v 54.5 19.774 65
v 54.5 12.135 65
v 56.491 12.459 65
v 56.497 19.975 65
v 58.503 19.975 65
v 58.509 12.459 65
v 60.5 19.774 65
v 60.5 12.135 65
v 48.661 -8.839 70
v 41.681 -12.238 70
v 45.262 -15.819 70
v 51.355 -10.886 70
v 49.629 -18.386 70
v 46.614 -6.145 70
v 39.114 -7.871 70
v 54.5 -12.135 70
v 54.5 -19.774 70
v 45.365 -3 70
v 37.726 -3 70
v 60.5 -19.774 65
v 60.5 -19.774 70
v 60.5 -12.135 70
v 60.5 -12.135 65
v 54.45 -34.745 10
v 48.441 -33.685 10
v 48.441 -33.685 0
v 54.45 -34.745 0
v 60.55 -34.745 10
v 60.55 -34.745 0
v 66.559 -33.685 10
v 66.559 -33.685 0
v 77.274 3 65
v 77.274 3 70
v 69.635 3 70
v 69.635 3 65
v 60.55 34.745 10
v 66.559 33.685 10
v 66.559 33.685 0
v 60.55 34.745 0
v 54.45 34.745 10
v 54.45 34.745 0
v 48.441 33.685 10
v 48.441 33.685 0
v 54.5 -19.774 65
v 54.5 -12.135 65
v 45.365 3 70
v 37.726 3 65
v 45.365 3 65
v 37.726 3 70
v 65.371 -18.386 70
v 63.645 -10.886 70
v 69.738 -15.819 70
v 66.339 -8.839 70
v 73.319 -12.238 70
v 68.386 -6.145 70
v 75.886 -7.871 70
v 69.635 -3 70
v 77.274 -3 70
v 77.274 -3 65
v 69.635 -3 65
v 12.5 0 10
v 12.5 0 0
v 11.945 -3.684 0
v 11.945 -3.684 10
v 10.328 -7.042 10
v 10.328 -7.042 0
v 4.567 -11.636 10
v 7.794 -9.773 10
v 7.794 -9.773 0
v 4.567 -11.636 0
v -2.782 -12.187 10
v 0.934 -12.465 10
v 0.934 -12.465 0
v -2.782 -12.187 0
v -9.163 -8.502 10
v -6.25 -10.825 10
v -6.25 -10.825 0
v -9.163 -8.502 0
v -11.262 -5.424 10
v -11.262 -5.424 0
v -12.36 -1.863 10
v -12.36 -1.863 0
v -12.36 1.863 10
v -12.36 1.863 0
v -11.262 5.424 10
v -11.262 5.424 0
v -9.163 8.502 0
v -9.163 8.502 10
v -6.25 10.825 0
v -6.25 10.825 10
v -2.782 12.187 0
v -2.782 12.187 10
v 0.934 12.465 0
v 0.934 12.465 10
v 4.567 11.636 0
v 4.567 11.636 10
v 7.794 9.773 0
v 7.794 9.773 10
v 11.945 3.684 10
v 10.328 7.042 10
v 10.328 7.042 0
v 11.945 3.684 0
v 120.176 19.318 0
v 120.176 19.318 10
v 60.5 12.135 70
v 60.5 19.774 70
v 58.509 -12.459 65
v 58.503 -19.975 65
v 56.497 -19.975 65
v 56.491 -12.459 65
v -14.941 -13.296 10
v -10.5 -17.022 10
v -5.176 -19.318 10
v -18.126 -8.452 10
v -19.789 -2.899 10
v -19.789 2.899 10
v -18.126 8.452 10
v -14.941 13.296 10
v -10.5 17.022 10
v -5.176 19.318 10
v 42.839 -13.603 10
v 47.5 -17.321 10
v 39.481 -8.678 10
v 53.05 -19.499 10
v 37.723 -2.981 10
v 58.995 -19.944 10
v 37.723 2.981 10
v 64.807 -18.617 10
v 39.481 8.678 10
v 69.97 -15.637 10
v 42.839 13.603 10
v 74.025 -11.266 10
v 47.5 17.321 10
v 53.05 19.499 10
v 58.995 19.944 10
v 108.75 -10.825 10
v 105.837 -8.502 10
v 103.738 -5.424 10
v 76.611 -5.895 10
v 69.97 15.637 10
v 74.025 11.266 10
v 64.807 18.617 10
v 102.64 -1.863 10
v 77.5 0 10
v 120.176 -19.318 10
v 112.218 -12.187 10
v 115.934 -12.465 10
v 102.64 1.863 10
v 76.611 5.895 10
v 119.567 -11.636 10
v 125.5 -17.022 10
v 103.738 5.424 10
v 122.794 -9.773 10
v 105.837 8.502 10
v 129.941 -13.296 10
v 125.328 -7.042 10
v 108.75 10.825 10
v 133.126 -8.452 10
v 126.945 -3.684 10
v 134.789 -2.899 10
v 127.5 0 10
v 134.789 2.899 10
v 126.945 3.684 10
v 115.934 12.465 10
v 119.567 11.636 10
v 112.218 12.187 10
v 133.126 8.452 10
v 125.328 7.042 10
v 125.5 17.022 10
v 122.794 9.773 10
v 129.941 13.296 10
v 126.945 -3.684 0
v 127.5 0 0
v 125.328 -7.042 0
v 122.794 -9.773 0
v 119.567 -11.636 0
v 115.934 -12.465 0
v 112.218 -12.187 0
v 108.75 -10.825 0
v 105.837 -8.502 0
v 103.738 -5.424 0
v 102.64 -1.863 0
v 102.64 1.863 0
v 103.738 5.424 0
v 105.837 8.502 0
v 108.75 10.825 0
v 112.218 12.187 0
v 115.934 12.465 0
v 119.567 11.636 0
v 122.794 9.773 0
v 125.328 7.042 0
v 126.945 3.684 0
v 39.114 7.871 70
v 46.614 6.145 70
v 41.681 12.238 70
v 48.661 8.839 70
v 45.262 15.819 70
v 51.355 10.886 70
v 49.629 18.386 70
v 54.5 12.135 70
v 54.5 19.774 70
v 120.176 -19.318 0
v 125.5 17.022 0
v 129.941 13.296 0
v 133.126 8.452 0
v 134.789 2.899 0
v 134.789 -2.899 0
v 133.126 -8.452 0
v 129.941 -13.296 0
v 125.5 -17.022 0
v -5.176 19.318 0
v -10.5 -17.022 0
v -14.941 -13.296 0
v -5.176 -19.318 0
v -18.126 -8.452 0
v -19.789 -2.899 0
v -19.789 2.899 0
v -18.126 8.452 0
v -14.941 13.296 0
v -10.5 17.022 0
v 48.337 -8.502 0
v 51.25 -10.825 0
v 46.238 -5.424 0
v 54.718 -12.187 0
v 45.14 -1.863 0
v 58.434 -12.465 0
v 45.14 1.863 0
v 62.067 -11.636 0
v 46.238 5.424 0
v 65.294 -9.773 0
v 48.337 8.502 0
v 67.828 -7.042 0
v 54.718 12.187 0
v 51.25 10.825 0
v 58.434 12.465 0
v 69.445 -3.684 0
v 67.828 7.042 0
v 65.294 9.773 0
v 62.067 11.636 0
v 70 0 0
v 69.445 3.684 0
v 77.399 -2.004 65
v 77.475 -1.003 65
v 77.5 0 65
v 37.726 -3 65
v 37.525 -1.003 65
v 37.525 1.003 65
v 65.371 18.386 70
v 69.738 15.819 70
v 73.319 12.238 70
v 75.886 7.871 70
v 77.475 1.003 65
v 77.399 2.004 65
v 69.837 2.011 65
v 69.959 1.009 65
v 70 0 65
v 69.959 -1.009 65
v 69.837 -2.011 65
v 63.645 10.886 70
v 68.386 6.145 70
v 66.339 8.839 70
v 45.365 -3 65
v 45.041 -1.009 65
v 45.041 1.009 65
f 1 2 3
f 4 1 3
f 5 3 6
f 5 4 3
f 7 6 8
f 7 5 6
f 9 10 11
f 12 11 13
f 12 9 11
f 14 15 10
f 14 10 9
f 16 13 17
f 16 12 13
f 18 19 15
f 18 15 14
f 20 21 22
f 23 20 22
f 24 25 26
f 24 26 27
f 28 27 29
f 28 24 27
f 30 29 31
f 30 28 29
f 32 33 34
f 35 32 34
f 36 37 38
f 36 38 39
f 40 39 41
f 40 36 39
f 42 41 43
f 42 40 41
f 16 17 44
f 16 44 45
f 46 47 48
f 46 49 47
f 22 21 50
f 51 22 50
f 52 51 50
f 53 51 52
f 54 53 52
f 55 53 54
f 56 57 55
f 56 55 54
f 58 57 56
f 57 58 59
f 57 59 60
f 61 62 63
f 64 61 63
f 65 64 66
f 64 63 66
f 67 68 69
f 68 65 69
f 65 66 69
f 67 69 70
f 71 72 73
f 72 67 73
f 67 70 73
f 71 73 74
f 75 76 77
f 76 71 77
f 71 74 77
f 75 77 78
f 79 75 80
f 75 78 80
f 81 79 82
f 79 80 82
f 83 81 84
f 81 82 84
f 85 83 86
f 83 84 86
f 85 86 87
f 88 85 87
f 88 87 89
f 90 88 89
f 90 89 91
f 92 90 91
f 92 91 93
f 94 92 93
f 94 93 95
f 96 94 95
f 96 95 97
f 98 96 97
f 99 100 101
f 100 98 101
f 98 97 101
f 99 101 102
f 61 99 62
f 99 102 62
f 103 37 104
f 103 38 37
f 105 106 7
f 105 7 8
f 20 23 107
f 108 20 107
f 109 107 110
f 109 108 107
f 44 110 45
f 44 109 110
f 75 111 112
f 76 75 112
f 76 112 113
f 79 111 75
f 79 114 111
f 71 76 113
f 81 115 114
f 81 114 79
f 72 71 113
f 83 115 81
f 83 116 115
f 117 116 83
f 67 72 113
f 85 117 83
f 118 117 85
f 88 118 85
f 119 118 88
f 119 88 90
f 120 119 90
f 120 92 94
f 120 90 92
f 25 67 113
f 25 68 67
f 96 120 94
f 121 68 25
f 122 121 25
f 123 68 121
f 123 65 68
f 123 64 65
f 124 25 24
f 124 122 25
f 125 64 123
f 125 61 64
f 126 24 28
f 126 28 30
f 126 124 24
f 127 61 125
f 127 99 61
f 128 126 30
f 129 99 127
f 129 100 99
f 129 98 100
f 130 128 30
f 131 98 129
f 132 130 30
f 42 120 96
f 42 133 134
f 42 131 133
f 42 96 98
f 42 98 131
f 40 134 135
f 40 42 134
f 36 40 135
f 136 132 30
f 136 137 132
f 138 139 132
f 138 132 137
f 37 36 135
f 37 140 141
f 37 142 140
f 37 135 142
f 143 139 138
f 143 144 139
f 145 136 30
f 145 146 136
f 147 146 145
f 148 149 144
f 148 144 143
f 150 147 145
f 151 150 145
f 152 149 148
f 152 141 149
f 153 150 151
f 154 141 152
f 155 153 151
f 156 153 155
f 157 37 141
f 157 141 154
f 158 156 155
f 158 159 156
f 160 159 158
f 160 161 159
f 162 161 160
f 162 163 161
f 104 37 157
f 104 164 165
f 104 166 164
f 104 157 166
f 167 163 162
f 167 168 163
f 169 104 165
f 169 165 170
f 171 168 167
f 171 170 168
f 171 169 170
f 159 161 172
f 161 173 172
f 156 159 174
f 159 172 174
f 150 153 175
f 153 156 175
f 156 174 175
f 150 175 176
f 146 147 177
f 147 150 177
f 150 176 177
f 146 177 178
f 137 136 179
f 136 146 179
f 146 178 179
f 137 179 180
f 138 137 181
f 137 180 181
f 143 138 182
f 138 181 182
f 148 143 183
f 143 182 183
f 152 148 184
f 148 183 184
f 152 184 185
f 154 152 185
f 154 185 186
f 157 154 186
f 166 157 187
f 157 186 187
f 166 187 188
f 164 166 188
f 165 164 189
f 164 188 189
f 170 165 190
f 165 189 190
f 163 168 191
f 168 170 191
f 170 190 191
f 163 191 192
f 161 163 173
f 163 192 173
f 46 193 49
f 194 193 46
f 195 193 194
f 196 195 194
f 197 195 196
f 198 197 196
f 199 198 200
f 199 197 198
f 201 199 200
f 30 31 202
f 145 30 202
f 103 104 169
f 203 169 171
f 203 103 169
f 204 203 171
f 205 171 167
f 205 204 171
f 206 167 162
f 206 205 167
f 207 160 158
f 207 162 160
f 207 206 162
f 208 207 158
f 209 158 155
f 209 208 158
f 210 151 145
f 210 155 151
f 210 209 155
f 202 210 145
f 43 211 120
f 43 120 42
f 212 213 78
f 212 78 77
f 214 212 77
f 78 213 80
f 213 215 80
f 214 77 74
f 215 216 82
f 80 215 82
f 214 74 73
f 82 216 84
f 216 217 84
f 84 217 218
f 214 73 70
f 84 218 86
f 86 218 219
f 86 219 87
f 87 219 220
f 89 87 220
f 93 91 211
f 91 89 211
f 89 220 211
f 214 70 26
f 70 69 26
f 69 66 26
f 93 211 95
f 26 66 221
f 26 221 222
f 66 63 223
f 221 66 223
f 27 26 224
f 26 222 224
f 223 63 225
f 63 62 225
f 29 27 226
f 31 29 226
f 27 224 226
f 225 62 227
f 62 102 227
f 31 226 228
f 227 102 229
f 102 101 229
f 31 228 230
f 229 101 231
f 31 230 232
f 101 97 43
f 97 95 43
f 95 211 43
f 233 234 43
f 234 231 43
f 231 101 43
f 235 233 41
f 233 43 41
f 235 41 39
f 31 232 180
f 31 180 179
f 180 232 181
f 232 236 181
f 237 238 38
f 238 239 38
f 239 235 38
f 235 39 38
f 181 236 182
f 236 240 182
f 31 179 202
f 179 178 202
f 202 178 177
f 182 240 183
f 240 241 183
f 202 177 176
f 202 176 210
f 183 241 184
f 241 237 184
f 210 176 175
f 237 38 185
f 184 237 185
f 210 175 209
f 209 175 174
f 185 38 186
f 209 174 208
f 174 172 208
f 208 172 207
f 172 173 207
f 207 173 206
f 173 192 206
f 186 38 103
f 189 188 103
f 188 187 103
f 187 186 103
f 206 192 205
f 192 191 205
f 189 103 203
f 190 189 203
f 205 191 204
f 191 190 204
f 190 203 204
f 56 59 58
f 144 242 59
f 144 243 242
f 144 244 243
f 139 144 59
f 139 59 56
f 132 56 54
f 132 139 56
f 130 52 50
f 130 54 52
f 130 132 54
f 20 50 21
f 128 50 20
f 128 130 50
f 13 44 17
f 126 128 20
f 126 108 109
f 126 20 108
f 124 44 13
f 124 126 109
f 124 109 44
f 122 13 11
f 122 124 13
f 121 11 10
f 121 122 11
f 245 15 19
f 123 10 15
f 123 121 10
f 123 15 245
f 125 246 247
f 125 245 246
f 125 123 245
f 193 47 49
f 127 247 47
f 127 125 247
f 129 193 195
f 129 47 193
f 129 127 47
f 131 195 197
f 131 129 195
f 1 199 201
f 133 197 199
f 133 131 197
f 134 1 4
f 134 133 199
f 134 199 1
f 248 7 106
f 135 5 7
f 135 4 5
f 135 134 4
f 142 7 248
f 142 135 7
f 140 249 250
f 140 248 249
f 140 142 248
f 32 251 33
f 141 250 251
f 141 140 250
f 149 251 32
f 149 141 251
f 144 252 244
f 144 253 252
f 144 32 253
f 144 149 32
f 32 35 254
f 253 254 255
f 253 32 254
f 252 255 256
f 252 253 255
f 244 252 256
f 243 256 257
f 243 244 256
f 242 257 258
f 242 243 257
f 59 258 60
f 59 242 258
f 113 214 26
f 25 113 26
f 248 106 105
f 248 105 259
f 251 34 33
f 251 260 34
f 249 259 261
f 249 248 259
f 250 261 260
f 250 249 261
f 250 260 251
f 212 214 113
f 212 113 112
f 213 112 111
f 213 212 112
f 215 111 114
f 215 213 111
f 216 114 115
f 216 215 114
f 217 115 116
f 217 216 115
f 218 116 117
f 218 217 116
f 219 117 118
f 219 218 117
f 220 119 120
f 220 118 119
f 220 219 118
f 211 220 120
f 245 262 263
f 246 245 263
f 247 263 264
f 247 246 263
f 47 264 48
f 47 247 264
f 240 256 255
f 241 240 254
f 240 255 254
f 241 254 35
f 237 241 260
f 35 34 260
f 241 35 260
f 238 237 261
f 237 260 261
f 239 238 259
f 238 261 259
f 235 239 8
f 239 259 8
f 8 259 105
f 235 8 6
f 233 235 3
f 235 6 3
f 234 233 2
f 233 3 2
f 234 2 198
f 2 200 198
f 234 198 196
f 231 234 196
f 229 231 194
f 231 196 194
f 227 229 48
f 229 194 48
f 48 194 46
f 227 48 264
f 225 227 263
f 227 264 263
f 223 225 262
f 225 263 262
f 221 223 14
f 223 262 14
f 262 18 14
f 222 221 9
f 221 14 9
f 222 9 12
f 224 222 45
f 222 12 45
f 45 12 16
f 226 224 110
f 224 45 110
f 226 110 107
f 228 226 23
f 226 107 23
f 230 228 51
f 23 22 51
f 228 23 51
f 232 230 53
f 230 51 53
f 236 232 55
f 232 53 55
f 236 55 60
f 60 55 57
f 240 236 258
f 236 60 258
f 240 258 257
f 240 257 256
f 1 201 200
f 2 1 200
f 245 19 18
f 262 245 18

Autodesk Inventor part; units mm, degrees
ref_plane "YZ Plane" through (0, 0, 0) normal (1, 0, 0) x (0, 1, 0)
ref_plane "XZ Plane" through (0, 0, 0) normal (0, 1, 0) x (-1, 0, 0)
ref_plane "XY Plane" through (0, 0, 0) normal (0, 0, 1) x (1, 0, 0)
sketch "Skizze1" plane through (0, 0, 0) normal (0, 0, 1) x (1, 0, 0)
  circle A0 centre (0, 0) radius 20
  line L0 (-5.1764, 19.3185) -> (57.5, 36.1126)
  line L1 (-5.1764, -19.3185) -> (57.5, -36.1126)
  circle A1 centre (115, 0) radius 20
  line L2 (57.5, 36.1126) -> (120.1764, 19.3185)
  line L3 (57.5, -36.1126) -> (120.1764, -19.3185)
  circle A2 centre (115, 0) radius 12.5
  circle A3 centre (0, 0) radius 12.5
  dimension "d4" = 40
  dimension "d5" = 25
  dimension "d6" = 25
  dimension "d7" = 115
  dimension "d8" = 57.5
  dimension "d9" = 30
  dimension "d10" = 30
extrude "Extrusion1" add sketch "Skizze1" along normal blind 10
sketch "Skizze2" plane through (0, 0, 10) normal (0, 0, 1) x (1, 0, 0)
  circle A0 centre (57.5, 0) radius 20
  point P0 (0, 0)
  point P1 (57.5, 36.1126)
  dimension "d13" = 40
extrude "Extrusion2" add sketch "Skizze2" along normal blind 60
sketch "Skizze3" plane through (57.5, 0, 70) normal (0, 0, 1) x (1, 0, 0)
  circle A0 centre (0, 0) radius 20 projected
  line L0 (0, 0) -> (0, 5.5377) construction
  circle A1 centre (0, 0) radius 12.5
  point P0 (-57.5, 0)
  dimension "d17" = 25
extrude "Extrusion3" cut sketch "Skizze3" against normal up to surface (70 mm away) contours A1
sketch "Skizze4" plane through (57.5, 0, 70) normal (0, 0, 1) x (1, 0, 0)
  circle A0 centre (0, 0) radius 12.5 projected
  circle A1 centre (0, 0) radius 20 projected
  line L0 (-3, 19.7737) -> (-3, 12.1347)
  line L1 (3, 19.7737) -> (3, 12.1347)
  line L2 (0, 0) -> (0, 16.2882) construction
  circle A2 centre (0, 0) radius 20 projected
  point P0 (-57.5, 0)
  point P1 (3, 19.7737)
  dimension "d20" = 6
extrude "Extrusion4" cut sketch "Skizze4" against normal blind 5 contours A0 L0 A1 L1 picked at (-2.3362, 14.7892)
pattern_circular "Runde Anordnung1" count 4 over 360 about axis through (57.5, 0, 10) along (0, 0, 1) of "Extrusion4"
fillet "Rundung1" radius 35 2 edges at (57.5, 36.1126, 5) (57.5, -36.1126, 5)
equation "\"d6\" = d5"
properties part number "lager_" material "Stahl, galvanisiert"
